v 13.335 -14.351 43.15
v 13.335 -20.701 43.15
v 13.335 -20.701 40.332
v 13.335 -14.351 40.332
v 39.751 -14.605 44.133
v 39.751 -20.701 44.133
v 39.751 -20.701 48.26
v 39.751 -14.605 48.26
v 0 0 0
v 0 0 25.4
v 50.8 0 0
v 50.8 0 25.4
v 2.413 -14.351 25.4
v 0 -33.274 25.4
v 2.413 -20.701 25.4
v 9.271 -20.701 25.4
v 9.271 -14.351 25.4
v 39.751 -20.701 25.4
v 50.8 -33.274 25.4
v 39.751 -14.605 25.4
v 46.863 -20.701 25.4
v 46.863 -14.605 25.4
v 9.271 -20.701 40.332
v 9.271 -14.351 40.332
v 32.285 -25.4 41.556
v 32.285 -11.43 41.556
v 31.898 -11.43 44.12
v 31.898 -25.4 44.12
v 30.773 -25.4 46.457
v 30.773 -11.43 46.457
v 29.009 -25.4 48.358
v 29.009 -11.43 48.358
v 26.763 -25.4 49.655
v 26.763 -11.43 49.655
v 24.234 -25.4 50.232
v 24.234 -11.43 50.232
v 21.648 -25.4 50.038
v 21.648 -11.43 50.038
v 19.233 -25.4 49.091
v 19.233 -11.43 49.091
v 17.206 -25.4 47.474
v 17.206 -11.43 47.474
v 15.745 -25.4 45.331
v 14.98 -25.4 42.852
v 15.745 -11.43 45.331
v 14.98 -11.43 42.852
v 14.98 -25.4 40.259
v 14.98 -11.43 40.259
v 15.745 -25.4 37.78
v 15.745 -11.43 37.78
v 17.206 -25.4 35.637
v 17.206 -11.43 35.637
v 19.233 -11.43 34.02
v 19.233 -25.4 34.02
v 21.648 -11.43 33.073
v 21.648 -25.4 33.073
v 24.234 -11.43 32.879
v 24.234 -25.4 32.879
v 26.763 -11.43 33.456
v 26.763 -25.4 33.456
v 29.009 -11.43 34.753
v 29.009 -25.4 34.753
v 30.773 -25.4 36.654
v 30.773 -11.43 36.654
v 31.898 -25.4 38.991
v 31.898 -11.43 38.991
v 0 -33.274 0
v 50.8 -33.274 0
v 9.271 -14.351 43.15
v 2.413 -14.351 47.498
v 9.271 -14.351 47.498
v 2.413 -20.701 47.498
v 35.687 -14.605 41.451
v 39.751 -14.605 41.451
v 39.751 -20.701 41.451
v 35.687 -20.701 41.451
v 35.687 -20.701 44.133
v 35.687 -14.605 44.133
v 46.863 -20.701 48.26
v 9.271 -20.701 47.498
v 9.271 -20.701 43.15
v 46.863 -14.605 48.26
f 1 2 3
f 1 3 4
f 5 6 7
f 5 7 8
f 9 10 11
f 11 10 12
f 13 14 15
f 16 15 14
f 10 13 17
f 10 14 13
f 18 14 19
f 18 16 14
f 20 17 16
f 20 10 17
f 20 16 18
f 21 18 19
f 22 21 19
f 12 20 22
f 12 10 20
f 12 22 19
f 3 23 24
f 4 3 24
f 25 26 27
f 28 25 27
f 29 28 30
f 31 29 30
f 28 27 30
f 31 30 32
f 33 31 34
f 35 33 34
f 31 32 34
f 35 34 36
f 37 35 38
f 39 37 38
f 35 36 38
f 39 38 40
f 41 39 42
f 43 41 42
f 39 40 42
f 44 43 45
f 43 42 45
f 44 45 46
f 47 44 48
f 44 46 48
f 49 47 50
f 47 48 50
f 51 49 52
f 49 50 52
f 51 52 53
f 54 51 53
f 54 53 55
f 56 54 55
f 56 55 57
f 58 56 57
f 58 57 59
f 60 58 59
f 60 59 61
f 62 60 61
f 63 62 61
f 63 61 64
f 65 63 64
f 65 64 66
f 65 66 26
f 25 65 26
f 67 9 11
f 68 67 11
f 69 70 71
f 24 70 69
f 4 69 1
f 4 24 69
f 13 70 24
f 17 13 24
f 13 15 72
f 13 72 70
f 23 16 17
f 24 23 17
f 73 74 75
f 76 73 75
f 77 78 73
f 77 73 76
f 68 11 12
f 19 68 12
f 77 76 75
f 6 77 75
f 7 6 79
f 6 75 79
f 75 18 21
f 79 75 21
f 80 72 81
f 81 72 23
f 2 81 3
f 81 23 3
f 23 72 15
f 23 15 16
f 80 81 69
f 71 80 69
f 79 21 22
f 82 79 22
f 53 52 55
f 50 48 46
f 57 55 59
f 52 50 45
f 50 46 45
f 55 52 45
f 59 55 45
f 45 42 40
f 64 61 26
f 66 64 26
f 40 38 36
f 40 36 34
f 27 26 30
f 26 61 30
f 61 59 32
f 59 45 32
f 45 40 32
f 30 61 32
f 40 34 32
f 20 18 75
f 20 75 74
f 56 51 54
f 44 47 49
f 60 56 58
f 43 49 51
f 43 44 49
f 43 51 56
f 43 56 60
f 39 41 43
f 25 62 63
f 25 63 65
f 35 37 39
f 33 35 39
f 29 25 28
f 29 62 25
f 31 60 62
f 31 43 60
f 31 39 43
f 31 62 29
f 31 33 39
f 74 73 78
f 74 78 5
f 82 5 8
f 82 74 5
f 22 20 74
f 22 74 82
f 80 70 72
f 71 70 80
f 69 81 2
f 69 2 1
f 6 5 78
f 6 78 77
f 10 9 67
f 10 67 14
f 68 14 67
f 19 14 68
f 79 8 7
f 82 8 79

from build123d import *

# Parameters (mm, degrees)
F0_W      = 50.8
F0_H      = 25.4
F1_DEPTH  = 45.72
F2_W      = 6.8580005318
F2_H      = 6.3500022516
F3_DEPTH  = 22.098
F4_W      = 7.1120001376
F4_H      = 6.0960017145
F5_DEPTH  = 22.86
F6_W      = 6.0960017145
F6_H      = 2.6826560497
F7_DEPTH  = 4.064
F8_W      = 6.3500022516
F8_H      = 2.8180144727
F9_DEPTH  = 4.064
F10_R     = 8.7009115444
F11_DEPTH = 25.4
F12_DEPTH = 11.43
F13_DEPTH = 12.446


with BuildPart() as f1:
    # F0 (on Front) → F1 (new body)
    with BuildSketch(Plane.XZ):
        with Locations((25.4, 12.7)):
            Rectangle(F0_W, F0_H)
    extrude(amount=F1_DEPTH)

    # F2 (on face) → F3 (join)
    with BuildSketch(Plane.XY.offset(25.4)):
        with Locations((5.842000246, -17.5260012038)):
            Rectangle(F2_W, F2_H)
    extrude(amount=F3_DEPTH)

    # F4 (on face) → F5 (join)
    with BuildSketch(Plane.XY.offset(25.4)):
        with Locations((43.3070007712, -17.6530014724)):
            Rectangle(F4_W, F4_H)
    extrude(amount=F5_DEPTH)

    # F6 (on face) → F7 (join)
    with BuildSketch(Plane(origin=(39.7510007024, 0, 0), x_dir=(0, -1, 0), z_dir=(-1, 0, 0))):
        with Locations((17.6530014724, 42.791865766)):
            Rectangle(F6_W, F6_H)
    extrude(amount=F7_DEPTH)

    # F8 (on face) → F9 (join)
    with BuildSketch(Plane.YZ.offset(9.2710005119)):
        with Locations((-17.5260012038, 41.7410153896)):
            Rectangle(F8_W, F8_H)
    extrude(amount=F9_DEPTH)

    # F13 (cut): a face of the model
    f13_faces = [f1.faces().sort_by_distance(p)[0] for p in [
        (25.4, -45.72, 12.7),
    ]]
    extrude(f13_faces, amount=-F13_DEPTH, mode=Mode.SUBTRACT)


with BuildPart() as f11:
    # F10 (on Front) → F11 (new body)
    with BuildSketch(Plane.XZ):
        with Locations((23.5838033259, 41.5556021035)):
            Circle(F10_R)
    extrude(amount=F11_DEPTH)

    # F12 (cut): a face of the model
    f12_faces = [f11.faces().sort_by_distance(p)[0] for p in [
        (23.5838033259, 0, 41.5556021035),
    ]]
    extrude(f12_faces, amount=-F12_DEPTH, mode=Mode.SUBTRACT)


solid = Compound([f1.part, f11.part])
